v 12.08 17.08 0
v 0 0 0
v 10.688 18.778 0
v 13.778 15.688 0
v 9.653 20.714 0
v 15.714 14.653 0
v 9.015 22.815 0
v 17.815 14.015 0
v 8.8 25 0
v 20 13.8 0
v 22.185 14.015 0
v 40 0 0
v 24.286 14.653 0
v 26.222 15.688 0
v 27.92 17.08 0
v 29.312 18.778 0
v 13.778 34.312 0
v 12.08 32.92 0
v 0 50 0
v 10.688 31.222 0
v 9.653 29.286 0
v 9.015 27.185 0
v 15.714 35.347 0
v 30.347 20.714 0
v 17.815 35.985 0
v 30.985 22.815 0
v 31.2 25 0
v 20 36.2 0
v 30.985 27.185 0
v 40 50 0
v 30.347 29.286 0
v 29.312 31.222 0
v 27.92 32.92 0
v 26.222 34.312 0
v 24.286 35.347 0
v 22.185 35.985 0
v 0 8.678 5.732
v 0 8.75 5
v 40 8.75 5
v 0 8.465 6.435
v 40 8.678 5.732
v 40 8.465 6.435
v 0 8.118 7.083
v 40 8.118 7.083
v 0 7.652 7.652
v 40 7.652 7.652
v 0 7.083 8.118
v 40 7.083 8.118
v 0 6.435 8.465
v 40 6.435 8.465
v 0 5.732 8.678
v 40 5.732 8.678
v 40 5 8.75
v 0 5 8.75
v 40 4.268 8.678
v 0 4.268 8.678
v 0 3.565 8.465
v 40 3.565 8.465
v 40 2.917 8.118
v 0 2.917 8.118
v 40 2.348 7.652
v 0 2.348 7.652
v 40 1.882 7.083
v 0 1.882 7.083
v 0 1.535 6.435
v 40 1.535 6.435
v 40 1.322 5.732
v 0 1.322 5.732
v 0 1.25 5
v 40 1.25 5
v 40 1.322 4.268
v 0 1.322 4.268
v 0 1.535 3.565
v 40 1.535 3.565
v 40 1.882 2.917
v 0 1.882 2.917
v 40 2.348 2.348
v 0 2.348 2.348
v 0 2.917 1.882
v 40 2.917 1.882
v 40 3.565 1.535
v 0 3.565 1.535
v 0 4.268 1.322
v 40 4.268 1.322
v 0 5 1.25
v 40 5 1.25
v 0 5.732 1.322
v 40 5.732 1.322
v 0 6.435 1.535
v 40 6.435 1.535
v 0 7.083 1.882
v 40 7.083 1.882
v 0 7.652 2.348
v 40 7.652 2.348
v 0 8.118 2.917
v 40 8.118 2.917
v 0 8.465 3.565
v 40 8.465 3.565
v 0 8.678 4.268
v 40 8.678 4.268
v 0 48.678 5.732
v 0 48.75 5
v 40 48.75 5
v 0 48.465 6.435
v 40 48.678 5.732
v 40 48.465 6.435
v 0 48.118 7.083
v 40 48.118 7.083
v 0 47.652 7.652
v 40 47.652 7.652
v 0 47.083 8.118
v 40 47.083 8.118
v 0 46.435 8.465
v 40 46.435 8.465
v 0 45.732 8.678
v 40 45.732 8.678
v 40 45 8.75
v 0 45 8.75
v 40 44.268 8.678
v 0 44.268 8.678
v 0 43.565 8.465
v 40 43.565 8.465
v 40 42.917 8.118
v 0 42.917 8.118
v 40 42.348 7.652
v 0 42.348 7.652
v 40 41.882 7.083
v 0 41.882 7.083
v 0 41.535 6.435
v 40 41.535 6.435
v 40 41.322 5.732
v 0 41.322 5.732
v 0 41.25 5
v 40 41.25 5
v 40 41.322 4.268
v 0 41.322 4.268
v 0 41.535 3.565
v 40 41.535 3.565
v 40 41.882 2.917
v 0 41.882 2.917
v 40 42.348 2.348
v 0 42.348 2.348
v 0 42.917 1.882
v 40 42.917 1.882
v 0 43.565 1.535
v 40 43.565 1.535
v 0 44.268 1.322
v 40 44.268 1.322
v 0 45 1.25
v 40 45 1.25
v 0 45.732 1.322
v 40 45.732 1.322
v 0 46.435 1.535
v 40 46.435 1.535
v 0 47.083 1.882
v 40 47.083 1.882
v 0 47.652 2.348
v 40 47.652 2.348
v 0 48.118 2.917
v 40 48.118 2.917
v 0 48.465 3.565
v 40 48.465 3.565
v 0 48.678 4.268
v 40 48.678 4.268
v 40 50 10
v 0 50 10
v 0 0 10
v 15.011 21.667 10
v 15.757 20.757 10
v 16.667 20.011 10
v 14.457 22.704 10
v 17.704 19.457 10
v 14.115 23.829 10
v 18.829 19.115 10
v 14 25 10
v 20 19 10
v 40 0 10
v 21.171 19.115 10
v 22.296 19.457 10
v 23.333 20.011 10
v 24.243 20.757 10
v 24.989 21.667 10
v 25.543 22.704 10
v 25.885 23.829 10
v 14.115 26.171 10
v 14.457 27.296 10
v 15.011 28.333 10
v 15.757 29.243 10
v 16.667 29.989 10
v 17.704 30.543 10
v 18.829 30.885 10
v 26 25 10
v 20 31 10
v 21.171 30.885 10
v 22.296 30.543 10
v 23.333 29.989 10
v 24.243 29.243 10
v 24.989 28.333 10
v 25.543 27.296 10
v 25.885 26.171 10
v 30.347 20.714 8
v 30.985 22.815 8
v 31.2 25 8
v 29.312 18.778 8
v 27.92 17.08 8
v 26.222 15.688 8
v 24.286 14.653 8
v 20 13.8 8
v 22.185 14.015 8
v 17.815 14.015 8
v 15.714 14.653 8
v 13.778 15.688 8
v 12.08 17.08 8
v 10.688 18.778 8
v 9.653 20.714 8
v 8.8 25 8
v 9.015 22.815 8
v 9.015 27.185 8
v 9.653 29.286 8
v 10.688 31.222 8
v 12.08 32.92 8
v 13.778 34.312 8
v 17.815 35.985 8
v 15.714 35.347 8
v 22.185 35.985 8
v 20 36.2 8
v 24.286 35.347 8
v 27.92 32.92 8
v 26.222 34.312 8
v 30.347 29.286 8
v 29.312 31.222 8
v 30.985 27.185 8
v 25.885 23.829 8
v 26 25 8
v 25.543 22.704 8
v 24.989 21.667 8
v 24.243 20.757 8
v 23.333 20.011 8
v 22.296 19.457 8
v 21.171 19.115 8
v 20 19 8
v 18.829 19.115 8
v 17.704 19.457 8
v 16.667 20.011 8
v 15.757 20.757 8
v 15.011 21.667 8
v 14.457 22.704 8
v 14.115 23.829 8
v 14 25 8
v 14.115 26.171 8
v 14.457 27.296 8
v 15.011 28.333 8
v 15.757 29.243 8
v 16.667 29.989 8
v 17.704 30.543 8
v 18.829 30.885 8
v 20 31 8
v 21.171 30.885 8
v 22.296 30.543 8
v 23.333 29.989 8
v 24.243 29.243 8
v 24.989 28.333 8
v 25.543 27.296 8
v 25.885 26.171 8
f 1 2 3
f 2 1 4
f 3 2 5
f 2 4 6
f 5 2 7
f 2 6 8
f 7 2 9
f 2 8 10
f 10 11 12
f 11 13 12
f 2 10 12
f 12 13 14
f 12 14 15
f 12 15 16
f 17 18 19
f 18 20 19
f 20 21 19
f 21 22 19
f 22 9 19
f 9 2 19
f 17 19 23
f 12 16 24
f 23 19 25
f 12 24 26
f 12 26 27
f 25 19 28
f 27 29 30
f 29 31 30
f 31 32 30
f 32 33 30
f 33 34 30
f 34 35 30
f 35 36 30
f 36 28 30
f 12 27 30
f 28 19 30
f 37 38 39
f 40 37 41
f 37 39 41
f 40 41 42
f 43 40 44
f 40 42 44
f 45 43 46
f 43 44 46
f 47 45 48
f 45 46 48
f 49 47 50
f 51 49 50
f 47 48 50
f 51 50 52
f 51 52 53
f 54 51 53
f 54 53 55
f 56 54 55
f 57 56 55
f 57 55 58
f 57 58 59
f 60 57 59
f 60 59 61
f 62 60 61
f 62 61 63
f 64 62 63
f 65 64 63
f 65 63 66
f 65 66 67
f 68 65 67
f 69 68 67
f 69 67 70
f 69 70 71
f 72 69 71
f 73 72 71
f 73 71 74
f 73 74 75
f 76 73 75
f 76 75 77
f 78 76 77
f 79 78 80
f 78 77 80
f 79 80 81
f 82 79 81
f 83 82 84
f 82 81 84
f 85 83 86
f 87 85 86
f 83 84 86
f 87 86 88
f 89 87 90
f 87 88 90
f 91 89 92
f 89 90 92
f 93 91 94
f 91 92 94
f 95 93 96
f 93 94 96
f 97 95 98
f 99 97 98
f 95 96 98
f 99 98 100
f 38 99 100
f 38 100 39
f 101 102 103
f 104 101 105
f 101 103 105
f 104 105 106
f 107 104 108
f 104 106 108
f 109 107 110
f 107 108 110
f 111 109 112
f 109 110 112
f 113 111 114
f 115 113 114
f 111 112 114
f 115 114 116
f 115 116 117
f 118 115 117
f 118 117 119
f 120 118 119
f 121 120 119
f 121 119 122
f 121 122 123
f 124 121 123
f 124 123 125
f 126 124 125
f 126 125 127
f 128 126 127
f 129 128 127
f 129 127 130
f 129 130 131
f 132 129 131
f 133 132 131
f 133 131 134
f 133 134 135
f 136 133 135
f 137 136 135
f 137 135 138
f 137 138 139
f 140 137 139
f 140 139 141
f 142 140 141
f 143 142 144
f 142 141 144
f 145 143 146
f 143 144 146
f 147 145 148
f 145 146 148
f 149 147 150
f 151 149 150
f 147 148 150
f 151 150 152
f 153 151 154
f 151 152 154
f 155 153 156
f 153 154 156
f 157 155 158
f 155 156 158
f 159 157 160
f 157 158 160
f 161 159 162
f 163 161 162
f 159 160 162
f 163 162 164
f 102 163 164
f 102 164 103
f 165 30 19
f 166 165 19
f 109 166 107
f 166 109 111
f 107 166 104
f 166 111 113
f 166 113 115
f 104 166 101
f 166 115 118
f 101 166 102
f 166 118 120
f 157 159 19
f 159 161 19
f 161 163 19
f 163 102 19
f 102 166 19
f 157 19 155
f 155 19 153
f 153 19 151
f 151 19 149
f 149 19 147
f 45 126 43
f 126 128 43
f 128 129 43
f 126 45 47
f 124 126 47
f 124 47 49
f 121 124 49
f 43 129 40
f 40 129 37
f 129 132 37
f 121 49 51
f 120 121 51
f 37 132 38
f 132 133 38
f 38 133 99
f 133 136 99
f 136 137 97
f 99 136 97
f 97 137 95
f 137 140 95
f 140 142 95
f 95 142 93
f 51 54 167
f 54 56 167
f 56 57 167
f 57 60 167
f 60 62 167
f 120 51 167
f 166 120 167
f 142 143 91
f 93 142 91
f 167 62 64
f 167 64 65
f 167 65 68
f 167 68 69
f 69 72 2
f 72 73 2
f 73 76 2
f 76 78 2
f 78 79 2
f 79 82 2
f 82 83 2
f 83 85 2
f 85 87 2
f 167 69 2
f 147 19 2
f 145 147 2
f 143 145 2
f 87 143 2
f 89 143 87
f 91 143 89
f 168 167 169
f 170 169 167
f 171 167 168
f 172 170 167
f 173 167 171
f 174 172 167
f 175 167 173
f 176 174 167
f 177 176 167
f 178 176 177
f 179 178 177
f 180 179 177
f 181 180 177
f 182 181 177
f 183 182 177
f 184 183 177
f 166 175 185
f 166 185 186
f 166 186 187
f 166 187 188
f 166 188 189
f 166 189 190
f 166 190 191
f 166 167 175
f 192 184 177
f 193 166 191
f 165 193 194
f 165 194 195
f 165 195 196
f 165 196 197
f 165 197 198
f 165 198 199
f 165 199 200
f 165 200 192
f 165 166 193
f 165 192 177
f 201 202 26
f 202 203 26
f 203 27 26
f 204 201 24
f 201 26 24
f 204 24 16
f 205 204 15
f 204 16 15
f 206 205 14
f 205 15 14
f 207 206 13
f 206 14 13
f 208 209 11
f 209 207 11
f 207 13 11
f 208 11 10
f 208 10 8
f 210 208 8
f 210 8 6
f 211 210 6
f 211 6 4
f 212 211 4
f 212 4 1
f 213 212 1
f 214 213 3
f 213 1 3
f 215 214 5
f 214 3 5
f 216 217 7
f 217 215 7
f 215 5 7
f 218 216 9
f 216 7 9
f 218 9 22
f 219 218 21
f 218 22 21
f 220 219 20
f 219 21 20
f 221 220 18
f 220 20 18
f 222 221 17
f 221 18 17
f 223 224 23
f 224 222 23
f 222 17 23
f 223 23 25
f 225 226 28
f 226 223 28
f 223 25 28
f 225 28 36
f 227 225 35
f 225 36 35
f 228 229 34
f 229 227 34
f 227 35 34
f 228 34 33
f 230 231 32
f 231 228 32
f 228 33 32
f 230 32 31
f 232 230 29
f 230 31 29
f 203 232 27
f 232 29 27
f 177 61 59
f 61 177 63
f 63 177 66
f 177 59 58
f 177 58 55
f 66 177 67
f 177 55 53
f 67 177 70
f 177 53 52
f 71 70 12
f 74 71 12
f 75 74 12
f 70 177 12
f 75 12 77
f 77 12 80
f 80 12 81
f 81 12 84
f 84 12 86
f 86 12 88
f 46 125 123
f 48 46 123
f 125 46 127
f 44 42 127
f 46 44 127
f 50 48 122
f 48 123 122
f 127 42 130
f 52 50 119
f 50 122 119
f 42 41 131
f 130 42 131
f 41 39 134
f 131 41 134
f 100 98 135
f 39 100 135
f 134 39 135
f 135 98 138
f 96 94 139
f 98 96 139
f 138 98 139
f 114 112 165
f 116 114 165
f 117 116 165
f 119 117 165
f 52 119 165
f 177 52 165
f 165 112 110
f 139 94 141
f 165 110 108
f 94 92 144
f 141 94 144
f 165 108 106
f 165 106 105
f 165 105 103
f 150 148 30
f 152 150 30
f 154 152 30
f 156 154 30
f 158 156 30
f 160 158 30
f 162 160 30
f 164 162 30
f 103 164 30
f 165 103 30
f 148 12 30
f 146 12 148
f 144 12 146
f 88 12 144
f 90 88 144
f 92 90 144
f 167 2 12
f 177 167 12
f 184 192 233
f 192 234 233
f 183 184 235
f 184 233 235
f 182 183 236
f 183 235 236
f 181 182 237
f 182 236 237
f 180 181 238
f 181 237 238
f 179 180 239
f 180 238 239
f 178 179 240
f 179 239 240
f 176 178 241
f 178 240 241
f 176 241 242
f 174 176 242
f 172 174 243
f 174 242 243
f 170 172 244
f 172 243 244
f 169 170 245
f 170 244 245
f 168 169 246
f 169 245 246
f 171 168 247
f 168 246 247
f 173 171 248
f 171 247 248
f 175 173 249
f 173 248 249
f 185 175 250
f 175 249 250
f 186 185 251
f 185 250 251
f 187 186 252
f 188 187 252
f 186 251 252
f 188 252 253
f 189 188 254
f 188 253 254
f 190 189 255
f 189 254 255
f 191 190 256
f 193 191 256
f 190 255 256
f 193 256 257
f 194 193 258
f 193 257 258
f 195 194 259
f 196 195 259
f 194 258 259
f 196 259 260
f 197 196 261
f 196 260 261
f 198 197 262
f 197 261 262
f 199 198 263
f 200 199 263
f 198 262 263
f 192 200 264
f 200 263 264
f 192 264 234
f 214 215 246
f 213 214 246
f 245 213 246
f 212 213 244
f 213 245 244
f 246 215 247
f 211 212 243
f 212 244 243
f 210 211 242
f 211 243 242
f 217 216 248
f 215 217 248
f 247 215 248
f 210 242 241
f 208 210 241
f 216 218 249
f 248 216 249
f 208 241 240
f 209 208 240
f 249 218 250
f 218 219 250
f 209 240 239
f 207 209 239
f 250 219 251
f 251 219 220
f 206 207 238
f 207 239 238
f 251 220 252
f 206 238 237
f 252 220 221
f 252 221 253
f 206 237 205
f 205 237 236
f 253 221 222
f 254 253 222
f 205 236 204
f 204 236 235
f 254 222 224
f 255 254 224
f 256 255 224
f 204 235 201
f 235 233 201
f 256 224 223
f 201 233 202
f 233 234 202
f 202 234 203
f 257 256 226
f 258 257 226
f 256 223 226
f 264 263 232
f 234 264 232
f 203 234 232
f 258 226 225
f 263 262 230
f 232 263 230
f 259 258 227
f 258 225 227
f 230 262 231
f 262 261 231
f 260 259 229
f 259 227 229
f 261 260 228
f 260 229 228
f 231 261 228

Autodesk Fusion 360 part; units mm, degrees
sketch "Top" plane through (0, 0, 0) normal (0, 0, 1) x (1, 0, 0)
  line L0 (0, 0) -> (40, 0)
  line L1 (40, 0) -> (40, 50)
  line L2 (40, 50) -> (0, 50)
  line L3 (0, 50) -> (0, 0)
  circle A0 centre (20, 25) radius 11.2
  circle A1 centre (20, 25) radius 6
  dimension "d6" = 40
  dimension "d7" = 50
  dimension "d11" = 22.4
  dimension "d12" = 25
  dimension "d13" = 20
  dimension "d27" = 12
extrude "Extrude1" add sketch "Top" along normal blind 10 contours L0 L1 L2 L3 | A0 | A1
extrude "Extrude2" cut sketch "Top" along normal blind 8 contours A0 | A1
sketch "Sketch2" plane through (40, 0, 0) normal (1, 0, 0) x (0, 1, 0)
  line L0 (0, 0) -> (50, 0)
  line L1 (50, 0) -> (50, 10)
  line L2 (50, 10) -> (0, 10)
  line L3 (0, 10) -> (0, 0)
  circle A0 centre (5, 5) radius 3.75
  circle A1 centre (45, 5) radius 3.75
  dimension "d16" = 7.5
  dimension "d17" = 7.5
  dimension "d18" = 5
  dimension "d19" = 5
  dimension "d20" = 5
  dimension "d21" = 5
extrude "Extrude3" cut sketch "Sketch2" against normal blind 50 contours A0
extrude "Extrude4" cut sketch "Sketch2" against normal blind 50 contours A1
extrude "Extrude5" cut sketch "Top" along normal blind 20 contours A1
equation "length = 50 mm"
equation "width = 40 mm"
equation "thickness = 10 mm"
equation "extra = 10 mm"
equation "fit_gap = 0.2 mm"
equation "d6 = width"
equation "d7 = length"
equation "d8 = thickness"
equation "bearing_outer_radius = 11.1 mm"
equation "d11 = ( bearing_outer_radius * 2 ) + fit_gap"
equation "d12 = length / 2"
equation "d13 = width / 2"
equation "d14 = thickness - 2 mm"
equation "d16 = 3 * thickness / 4"
equation "d17 = 3 * thickness / 4"
equation "d18 = thickness / 2"
equation "d19 = thickness / 2"
equation "d20 = thickness / 2"
equation "d21 = thickness / 2"
equation "d22 = -( width + extra )"
equation "d24 = -( width + extra )"
equation "bearing_inner_radius = ( 8 mm + 4 mm ) / 2"
equation "d27 = bearing_inner_radius * 2"
equation "d28 = thickness + extra"
